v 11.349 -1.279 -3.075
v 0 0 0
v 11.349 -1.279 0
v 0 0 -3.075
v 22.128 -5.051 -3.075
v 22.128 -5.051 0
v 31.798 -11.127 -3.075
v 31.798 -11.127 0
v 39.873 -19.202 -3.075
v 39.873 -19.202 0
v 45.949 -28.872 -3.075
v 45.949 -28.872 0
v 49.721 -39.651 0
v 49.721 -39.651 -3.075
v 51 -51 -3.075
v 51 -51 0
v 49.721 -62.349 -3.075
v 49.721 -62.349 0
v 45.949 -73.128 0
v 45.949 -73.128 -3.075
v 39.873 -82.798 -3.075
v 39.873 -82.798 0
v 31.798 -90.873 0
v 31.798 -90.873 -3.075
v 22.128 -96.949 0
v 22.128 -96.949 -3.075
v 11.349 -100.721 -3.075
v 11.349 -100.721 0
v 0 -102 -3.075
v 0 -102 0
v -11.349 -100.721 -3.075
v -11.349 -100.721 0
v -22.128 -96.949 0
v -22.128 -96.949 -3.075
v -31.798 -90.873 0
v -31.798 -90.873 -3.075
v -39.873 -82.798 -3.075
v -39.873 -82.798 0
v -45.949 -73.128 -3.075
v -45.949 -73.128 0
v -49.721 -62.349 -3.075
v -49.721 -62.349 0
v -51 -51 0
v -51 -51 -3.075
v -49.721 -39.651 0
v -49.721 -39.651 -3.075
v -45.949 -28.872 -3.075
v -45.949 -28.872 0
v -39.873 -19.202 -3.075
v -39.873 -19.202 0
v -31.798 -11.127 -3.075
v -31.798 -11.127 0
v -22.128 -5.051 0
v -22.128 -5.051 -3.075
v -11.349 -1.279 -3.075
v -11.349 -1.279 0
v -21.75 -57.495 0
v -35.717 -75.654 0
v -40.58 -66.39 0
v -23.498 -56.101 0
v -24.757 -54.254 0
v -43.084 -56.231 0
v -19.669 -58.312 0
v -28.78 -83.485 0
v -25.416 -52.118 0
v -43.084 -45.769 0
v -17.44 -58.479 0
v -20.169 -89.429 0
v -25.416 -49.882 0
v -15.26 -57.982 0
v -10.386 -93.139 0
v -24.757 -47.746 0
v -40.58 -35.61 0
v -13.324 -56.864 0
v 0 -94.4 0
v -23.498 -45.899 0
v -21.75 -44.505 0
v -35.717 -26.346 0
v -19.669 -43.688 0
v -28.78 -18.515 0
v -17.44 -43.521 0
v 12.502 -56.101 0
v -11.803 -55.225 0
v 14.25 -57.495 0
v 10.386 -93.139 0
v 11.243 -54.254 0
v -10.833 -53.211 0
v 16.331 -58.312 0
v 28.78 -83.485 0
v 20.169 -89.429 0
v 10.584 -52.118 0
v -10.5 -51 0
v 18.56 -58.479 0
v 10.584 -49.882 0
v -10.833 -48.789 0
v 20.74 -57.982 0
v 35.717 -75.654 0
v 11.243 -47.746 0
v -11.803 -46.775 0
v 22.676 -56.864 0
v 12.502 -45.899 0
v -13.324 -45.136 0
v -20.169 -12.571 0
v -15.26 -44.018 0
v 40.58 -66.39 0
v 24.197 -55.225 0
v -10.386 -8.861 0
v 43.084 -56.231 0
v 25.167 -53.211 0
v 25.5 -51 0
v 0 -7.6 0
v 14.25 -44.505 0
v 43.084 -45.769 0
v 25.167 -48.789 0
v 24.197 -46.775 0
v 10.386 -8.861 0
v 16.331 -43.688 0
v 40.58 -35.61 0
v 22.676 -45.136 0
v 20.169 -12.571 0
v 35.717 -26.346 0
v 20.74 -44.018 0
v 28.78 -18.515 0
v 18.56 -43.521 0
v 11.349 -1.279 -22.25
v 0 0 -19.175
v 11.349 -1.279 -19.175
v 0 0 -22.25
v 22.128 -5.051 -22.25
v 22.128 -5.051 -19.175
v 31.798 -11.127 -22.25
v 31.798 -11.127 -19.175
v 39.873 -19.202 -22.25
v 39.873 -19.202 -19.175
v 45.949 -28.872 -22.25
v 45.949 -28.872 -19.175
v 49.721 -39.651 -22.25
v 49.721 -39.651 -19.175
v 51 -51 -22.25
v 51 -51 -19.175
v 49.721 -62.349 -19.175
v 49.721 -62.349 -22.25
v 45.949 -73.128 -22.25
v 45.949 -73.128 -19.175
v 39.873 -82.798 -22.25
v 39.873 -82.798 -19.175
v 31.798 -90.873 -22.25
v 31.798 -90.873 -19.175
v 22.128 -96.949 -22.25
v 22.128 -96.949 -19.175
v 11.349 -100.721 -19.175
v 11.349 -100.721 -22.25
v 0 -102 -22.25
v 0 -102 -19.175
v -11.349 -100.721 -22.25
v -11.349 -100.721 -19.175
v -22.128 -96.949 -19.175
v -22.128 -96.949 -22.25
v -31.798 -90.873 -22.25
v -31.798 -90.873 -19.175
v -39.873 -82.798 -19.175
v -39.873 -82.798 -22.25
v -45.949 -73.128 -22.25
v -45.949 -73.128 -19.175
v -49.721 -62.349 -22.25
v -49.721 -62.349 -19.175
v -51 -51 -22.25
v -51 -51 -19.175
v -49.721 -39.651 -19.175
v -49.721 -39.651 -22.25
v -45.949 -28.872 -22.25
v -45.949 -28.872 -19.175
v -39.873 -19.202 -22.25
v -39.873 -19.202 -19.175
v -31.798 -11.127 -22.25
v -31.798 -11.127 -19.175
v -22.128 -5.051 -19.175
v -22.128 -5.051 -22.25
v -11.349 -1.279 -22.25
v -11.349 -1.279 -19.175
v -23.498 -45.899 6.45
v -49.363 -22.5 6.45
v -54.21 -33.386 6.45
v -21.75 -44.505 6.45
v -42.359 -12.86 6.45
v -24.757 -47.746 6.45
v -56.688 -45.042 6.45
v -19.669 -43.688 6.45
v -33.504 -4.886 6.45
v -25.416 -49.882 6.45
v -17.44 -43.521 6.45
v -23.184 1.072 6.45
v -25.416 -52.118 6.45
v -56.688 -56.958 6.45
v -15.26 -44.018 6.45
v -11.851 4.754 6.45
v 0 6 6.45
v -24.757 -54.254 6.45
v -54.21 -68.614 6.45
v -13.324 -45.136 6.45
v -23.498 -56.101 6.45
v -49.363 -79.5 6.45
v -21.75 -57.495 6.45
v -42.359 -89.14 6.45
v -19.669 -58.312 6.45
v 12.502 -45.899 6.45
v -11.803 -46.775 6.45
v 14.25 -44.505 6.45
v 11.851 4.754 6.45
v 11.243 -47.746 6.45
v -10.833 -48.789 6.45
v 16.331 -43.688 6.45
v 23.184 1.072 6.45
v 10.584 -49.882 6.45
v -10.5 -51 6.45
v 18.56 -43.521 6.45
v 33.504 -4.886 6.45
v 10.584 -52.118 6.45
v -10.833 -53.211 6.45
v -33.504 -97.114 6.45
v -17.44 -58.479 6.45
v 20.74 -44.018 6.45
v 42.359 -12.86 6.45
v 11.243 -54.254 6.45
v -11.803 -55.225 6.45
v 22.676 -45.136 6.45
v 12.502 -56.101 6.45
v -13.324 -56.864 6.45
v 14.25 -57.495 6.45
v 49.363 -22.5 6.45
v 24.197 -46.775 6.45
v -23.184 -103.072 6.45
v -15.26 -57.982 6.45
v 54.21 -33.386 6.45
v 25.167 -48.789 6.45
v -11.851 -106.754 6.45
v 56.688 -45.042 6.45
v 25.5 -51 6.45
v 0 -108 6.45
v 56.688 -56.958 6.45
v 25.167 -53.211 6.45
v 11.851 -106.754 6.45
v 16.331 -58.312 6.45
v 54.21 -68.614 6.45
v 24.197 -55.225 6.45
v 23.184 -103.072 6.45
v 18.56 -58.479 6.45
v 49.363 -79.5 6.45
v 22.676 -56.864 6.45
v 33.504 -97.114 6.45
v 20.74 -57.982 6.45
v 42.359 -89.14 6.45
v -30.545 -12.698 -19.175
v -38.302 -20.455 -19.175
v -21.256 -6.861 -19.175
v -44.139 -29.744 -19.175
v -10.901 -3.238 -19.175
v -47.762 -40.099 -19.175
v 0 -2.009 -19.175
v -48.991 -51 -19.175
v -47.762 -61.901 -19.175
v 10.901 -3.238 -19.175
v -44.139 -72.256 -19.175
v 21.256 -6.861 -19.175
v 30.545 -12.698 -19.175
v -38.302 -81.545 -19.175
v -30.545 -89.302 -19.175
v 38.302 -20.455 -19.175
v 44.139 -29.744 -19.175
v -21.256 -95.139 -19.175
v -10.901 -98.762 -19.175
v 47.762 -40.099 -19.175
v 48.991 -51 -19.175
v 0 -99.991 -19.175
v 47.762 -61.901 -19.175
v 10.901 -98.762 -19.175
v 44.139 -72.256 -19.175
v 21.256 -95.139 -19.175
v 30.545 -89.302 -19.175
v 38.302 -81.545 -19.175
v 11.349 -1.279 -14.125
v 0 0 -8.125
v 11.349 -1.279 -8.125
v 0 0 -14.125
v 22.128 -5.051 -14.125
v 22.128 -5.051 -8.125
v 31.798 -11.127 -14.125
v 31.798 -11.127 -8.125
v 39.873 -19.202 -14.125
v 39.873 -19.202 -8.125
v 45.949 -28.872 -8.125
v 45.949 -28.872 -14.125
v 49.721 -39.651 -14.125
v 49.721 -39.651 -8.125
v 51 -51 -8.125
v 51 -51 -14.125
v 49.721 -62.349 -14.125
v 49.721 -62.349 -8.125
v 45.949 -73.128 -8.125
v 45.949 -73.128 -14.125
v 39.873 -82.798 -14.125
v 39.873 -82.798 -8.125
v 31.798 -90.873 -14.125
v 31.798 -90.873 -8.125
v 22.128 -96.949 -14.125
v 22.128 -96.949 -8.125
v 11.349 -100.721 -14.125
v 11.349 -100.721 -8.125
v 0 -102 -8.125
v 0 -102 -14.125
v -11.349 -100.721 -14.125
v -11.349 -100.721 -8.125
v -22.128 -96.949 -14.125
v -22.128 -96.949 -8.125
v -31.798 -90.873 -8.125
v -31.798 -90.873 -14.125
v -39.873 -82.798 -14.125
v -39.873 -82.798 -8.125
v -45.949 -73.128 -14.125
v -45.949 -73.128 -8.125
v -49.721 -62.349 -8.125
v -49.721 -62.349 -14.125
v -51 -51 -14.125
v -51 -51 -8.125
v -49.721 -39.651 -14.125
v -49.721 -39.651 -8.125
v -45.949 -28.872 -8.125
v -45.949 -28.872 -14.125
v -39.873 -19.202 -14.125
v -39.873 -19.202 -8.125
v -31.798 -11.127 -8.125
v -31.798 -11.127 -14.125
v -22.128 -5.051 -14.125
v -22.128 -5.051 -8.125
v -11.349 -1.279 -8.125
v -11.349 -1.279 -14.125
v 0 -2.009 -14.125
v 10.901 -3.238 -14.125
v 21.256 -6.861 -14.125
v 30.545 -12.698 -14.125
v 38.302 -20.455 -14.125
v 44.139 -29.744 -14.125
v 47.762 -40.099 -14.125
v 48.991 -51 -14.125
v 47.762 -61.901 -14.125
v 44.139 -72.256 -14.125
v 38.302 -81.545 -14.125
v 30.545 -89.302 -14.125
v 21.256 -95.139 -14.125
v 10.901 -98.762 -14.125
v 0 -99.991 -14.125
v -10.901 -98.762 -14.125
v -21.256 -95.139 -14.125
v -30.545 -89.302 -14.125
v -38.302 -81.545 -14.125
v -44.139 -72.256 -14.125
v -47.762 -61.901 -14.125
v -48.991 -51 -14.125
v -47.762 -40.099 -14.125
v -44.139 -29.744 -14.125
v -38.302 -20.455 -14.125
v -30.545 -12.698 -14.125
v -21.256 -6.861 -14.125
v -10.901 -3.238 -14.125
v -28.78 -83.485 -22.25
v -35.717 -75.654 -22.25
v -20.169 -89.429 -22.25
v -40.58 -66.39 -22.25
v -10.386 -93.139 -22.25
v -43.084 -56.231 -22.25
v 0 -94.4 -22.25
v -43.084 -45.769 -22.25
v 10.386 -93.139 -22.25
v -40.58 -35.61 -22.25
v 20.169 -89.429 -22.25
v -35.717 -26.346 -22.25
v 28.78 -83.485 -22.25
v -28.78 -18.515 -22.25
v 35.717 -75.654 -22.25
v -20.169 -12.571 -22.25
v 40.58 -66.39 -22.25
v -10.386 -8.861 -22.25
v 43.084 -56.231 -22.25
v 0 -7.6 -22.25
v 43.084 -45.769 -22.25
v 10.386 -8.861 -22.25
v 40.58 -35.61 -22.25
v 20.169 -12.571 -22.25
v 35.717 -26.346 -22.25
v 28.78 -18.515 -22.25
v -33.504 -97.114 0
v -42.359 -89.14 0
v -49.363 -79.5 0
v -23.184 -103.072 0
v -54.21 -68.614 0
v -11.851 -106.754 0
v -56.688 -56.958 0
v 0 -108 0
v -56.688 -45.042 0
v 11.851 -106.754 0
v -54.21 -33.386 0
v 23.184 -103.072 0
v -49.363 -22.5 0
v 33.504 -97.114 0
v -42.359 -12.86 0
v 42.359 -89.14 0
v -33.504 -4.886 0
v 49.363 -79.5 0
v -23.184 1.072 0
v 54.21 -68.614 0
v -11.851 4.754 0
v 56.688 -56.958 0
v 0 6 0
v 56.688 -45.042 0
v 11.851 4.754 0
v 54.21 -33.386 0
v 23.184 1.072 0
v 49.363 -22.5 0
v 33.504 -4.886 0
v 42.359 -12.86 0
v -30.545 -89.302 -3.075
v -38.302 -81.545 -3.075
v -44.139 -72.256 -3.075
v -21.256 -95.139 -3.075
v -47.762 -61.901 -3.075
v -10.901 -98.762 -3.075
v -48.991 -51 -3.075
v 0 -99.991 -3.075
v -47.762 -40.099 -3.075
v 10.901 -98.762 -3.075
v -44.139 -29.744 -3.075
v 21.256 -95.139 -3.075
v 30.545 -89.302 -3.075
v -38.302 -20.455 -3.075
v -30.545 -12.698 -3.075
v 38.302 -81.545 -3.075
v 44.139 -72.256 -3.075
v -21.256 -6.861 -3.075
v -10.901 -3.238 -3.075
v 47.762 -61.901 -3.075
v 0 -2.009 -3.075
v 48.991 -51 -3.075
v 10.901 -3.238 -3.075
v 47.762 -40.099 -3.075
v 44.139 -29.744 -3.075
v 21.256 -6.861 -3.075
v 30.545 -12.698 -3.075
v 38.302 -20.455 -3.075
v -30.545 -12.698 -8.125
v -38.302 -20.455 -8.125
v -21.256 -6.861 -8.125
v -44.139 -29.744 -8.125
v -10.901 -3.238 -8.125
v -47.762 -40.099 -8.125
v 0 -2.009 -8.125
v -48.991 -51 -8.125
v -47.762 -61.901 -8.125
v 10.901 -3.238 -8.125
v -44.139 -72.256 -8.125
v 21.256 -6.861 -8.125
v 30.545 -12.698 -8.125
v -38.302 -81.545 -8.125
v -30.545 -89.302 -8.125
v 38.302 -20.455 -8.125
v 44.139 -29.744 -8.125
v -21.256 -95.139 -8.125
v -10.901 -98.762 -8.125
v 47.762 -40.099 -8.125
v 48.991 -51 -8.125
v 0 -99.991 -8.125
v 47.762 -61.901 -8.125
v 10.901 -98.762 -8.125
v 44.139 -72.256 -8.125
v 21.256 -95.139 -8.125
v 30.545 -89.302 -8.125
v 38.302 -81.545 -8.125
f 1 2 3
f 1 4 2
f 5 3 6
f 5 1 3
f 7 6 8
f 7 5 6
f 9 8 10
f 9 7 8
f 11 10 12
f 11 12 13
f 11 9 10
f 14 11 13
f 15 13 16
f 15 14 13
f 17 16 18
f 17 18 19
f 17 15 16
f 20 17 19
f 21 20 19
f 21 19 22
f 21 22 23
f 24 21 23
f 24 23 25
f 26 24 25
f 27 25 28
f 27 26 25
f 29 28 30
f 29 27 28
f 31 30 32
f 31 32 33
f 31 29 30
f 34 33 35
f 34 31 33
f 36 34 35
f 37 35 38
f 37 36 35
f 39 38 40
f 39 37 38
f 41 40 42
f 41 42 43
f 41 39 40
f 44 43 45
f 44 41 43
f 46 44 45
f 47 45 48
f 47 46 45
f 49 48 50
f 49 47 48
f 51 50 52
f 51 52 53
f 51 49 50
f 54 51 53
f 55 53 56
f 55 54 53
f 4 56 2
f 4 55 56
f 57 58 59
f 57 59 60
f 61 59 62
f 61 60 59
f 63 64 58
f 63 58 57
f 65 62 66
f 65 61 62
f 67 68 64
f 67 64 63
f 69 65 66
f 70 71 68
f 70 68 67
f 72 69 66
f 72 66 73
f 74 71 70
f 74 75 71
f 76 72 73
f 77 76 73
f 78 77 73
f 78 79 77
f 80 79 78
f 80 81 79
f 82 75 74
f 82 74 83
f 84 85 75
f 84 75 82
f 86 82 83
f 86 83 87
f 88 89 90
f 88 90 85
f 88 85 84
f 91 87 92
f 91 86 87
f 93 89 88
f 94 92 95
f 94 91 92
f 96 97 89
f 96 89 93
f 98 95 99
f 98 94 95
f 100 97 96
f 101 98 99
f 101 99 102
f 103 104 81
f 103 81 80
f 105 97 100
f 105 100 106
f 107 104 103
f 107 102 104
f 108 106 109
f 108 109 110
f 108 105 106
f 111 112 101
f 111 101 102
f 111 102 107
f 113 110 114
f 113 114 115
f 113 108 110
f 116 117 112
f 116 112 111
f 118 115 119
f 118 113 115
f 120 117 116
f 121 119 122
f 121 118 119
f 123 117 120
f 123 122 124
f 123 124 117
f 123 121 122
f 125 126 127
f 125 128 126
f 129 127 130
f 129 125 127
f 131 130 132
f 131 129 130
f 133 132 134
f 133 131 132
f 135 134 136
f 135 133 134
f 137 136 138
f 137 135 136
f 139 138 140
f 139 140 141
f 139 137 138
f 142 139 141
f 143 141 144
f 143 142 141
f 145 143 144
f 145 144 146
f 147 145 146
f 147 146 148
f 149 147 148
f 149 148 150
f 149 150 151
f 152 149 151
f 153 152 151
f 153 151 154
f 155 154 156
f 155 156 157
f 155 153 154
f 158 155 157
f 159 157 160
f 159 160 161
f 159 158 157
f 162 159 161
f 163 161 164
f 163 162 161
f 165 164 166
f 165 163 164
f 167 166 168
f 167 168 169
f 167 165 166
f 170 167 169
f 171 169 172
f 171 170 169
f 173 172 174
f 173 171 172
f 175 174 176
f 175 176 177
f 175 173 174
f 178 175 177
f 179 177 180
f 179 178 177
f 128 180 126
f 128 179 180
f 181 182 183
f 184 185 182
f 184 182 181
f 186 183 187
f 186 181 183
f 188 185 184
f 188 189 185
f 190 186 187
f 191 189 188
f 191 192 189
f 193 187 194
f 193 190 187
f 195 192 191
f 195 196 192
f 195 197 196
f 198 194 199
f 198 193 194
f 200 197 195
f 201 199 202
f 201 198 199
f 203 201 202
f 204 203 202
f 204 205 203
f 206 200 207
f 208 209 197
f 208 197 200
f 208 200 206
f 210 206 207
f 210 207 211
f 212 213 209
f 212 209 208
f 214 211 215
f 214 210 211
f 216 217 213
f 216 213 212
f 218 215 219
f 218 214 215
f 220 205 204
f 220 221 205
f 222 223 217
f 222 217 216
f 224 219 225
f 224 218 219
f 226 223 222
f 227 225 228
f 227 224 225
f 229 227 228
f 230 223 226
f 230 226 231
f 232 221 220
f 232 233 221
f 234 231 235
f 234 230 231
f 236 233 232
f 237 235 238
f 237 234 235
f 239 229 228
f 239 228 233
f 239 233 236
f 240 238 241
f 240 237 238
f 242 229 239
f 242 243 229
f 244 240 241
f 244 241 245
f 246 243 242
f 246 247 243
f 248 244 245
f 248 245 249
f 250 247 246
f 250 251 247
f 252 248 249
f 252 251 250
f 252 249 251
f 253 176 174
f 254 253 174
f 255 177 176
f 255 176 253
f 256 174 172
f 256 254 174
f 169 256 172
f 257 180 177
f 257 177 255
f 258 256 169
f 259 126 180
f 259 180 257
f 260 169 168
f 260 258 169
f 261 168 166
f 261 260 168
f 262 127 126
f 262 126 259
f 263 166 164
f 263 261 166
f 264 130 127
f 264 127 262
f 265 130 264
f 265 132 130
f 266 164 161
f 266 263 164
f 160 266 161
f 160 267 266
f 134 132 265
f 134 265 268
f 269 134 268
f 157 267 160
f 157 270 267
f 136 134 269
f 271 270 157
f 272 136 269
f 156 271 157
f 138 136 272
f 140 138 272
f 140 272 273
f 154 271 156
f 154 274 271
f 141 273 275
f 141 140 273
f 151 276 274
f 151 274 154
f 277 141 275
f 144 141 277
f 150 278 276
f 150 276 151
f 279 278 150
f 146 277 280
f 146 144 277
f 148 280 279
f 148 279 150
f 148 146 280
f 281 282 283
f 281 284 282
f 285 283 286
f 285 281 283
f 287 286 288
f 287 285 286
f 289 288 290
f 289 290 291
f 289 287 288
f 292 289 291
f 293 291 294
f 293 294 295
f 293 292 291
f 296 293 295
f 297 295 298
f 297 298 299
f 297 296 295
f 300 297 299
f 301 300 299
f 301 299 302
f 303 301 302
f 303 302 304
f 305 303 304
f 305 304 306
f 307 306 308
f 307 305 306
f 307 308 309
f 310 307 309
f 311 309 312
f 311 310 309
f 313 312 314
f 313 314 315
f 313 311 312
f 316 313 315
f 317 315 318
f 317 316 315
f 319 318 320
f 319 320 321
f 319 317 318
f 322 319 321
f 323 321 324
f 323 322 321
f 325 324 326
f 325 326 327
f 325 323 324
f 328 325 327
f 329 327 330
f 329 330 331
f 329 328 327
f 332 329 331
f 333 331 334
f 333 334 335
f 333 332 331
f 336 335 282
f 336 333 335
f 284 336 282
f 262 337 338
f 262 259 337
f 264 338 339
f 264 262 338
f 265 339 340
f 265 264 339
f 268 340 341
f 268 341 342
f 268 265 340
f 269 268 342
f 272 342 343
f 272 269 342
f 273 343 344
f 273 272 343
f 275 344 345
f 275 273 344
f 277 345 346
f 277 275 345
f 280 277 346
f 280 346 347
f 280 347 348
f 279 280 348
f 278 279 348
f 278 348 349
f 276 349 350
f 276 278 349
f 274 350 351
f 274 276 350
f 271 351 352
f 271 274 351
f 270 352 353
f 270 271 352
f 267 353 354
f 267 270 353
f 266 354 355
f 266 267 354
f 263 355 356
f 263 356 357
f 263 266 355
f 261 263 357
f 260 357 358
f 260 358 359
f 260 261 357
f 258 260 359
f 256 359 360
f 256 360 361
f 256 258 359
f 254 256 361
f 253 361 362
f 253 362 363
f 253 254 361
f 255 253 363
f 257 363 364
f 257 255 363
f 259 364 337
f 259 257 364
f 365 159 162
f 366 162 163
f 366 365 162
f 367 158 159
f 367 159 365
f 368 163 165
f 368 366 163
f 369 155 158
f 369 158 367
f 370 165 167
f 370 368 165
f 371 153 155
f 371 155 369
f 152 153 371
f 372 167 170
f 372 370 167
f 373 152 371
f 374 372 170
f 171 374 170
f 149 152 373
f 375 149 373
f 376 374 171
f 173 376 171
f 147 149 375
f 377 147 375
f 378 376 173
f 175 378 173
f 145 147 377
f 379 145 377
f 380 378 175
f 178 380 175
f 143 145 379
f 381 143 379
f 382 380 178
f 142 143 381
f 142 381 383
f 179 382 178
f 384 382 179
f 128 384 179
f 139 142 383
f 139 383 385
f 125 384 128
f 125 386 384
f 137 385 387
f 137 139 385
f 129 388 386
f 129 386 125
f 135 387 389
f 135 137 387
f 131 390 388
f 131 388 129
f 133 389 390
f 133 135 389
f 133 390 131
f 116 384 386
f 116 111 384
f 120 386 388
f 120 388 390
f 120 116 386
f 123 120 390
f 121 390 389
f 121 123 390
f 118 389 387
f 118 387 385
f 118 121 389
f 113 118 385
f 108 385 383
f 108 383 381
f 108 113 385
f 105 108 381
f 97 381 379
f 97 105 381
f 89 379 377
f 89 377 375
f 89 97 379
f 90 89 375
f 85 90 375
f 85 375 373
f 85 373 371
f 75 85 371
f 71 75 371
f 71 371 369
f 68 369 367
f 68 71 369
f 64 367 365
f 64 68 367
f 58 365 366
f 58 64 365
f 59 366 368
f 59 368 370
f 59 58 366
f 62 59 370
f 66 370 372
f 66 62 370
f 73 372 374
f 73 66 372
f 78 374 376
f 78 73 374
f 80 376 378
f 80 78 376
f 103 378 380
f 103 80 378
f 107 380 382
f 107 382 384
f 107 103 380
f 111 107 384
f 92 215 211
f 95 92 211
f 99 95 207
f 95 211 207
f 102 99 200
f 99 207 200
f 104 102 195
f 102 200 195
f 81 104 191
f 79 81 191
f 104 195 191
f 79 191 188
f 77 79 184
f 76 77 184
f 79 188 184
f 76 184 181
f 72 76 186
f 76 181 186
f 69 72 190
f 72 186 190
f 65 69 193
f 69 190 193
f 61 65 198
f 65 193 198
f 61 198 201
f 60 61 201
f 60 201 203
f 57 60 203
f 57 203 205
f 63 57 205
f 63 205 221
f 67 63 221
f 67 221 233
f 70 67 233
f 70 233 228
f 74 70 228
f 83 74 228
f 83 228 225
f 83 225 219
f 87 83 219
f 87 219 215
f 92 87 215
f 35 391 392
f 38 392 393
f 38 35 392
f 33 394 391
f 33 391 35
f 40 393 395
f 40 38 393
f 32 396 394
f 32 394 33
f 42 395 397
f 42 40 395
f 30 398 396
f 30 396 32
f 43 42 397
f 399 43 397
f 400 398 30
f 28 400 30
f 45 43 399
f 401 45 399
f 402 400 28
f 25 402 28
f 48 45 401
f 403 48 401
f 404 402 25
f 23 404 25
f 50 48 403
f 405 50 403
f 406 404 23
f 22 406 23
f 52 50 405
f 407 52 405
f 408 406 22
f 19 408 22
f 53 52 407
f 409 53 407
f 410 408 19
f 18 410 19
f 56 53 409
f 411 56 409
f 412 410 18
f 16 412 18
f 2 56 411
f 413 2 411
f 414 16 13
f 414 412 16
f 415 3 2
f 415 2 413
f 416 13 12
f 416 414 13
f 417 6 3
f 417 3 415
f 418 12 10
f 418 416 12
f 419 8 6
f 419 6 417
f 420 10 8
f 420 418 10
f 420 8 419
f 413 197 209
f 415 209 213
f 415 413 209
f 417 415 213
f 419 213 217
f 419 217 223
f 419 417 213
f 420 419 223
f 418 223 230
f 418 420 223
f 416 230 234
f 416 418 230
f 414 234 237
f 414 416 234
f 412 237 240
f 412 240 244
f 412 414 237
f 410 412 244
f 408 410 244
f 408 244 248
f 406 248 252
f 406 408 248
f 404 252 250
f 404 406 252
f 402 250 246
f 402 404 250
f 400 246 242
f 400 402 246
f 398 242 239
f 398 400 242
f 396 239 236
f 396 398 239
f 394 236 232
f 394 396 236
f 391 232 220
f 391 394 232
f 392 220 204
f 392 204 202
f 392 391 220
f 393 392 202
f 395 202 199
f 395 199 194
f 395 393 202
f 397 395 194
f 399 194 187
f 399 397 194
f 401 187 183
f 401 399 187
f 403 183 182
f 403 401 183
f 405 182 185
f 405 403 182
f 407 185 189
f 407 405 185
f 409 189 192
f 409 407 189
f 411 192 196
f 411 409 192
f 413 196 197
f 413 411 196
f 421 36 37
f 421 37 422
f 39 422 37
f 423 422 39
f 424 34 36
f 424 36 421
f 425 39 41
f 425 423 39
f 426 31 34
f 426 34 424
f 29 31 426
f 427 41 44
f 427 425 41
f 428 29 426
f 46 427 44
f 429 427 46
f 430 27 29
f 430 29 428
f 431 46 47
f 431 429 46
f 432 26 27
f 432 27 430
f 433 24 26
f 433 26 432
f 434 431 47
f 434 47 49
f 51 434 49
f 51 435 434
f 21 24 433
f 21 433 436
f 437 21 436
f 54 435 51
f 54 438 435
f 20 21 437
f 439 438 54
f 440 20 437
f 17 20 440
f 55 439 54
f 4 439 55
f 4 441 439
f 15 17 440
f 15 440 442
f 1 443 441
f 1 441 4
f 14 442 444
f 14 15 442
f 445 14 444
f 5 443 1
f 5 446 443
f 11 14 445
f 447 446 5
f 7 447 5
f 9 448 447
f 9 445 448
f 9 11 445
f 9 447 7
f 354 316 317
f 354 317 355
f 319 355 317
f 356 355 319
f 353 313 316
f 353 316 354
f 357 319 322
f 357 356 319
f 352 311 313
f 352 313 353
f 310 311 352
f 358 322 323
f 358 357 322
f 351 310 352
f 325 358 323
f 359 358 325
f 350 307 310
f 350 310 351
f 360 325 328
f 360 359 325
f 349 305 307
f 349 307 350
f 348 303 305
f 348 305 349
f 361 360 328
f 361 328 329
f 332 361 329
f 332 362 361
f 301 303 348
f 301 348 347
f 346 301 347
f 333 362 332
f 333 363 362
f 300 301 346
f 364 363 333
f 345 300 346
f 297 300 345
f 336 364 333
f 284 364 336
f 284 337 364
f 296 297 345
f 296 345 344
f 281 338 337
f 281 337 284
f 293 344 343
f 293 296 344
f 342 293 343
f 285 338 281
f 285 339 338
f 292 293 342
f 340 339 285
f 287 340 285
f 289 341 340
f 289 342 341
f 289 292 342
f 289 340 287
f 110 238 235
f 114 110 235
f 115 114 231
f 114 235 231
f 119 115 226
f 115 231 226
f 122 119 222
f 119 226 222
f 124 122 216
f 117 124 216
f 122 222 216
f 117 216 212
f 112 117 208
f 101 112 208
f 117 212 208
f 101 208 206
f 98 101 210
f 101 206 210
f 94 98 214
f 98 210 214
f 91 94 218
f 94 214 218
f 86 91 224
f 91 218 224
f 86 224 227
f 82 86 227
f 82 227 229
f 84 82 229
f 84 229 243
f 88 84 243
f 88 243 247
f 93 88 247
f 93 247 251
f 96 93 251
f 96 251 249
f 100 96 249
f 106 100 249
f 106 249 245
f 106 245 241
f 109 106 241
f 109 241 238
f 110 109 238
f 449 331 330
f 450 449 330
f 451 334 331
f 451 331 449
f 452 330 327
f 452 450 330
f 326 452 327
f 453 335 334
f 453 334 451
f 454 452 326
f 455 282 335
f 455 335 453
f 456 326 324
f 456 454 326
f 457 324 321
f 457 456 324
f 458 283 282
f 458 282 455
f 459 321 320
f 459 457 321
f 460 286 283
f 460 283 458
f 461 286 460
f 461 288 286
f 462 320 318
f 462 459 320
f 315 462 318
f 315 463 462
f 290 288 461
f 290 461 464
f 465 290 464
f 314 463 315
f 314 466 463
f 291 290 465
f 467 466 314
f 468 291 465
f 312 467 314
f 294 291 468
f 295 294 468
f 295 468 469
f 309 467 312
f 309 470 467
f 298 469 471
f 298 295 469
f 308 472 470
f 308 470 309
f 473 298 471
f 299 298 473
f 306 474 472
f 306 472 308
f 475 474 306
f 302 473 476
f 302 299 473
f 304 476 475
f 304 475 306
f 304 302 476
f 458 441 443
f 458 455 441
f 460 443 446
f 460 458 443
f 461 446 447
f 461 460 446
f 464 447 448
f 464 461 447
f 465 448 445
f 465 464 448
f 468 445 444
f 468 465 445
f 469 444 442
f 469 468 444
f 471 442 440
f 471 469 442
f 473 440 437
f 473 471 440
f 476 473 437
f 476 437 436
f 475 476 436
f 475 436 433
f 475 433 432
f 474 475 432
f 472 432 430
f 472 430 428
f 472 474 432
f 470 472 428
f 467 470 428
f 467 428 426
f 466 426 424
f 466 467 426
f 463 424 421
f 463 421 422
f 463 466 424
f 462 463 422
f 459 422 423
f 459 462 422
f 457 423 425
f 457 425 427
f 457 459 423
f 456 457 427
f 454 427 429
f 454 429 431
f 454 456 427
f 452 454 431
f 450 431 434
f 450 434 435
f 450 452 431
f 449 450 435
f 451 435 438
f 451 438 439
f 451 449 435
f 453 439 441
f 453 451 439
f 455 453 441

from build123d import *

# Parameters (mm, degrees)
SKETCH2_R          = 7.5
CUT_EXTRUDE2_DEPTH = 29.7


with BuildPart() as part:
    # Sketch1 → Revolve1 (revolve)
    with BuildSketch(Plane(origin=(0, 0, 0), x_dir=(0, 0, -1), z_dir=(1, 0, 0))):
        Polygon((-6.45, 6), (0, 6), (0, 0), (3.075, 0), (3.075, -2.009350098), (8.125, -2.009350098), (8.125, 0), (14.125, 0), (14.125, -2.009350098), (19.175, -2.009350098), (19.175, 0), (22.25, 0), (22.25, -7.6), (0, -7.6), (0, -51), (-6.45, -51), align=None)
    revolve(axis=Axis((0, -51, 6.45), (0, 0, -1)))

    # Sketch2 → Cut-Extrude2 (cut, through all)
    with BuildSketch(Plane.XY.offset(6.45)):
        with Locations((18, -51)):
            Circle(SKETCH2_R)
        with Locations((-18, -51)):
            Circle(SKETCH2_R)
    extrude(amount=-CUT_EXTRUDE2_DEPTH, mode=Mode.SUBTRACT)


solid = part.part
